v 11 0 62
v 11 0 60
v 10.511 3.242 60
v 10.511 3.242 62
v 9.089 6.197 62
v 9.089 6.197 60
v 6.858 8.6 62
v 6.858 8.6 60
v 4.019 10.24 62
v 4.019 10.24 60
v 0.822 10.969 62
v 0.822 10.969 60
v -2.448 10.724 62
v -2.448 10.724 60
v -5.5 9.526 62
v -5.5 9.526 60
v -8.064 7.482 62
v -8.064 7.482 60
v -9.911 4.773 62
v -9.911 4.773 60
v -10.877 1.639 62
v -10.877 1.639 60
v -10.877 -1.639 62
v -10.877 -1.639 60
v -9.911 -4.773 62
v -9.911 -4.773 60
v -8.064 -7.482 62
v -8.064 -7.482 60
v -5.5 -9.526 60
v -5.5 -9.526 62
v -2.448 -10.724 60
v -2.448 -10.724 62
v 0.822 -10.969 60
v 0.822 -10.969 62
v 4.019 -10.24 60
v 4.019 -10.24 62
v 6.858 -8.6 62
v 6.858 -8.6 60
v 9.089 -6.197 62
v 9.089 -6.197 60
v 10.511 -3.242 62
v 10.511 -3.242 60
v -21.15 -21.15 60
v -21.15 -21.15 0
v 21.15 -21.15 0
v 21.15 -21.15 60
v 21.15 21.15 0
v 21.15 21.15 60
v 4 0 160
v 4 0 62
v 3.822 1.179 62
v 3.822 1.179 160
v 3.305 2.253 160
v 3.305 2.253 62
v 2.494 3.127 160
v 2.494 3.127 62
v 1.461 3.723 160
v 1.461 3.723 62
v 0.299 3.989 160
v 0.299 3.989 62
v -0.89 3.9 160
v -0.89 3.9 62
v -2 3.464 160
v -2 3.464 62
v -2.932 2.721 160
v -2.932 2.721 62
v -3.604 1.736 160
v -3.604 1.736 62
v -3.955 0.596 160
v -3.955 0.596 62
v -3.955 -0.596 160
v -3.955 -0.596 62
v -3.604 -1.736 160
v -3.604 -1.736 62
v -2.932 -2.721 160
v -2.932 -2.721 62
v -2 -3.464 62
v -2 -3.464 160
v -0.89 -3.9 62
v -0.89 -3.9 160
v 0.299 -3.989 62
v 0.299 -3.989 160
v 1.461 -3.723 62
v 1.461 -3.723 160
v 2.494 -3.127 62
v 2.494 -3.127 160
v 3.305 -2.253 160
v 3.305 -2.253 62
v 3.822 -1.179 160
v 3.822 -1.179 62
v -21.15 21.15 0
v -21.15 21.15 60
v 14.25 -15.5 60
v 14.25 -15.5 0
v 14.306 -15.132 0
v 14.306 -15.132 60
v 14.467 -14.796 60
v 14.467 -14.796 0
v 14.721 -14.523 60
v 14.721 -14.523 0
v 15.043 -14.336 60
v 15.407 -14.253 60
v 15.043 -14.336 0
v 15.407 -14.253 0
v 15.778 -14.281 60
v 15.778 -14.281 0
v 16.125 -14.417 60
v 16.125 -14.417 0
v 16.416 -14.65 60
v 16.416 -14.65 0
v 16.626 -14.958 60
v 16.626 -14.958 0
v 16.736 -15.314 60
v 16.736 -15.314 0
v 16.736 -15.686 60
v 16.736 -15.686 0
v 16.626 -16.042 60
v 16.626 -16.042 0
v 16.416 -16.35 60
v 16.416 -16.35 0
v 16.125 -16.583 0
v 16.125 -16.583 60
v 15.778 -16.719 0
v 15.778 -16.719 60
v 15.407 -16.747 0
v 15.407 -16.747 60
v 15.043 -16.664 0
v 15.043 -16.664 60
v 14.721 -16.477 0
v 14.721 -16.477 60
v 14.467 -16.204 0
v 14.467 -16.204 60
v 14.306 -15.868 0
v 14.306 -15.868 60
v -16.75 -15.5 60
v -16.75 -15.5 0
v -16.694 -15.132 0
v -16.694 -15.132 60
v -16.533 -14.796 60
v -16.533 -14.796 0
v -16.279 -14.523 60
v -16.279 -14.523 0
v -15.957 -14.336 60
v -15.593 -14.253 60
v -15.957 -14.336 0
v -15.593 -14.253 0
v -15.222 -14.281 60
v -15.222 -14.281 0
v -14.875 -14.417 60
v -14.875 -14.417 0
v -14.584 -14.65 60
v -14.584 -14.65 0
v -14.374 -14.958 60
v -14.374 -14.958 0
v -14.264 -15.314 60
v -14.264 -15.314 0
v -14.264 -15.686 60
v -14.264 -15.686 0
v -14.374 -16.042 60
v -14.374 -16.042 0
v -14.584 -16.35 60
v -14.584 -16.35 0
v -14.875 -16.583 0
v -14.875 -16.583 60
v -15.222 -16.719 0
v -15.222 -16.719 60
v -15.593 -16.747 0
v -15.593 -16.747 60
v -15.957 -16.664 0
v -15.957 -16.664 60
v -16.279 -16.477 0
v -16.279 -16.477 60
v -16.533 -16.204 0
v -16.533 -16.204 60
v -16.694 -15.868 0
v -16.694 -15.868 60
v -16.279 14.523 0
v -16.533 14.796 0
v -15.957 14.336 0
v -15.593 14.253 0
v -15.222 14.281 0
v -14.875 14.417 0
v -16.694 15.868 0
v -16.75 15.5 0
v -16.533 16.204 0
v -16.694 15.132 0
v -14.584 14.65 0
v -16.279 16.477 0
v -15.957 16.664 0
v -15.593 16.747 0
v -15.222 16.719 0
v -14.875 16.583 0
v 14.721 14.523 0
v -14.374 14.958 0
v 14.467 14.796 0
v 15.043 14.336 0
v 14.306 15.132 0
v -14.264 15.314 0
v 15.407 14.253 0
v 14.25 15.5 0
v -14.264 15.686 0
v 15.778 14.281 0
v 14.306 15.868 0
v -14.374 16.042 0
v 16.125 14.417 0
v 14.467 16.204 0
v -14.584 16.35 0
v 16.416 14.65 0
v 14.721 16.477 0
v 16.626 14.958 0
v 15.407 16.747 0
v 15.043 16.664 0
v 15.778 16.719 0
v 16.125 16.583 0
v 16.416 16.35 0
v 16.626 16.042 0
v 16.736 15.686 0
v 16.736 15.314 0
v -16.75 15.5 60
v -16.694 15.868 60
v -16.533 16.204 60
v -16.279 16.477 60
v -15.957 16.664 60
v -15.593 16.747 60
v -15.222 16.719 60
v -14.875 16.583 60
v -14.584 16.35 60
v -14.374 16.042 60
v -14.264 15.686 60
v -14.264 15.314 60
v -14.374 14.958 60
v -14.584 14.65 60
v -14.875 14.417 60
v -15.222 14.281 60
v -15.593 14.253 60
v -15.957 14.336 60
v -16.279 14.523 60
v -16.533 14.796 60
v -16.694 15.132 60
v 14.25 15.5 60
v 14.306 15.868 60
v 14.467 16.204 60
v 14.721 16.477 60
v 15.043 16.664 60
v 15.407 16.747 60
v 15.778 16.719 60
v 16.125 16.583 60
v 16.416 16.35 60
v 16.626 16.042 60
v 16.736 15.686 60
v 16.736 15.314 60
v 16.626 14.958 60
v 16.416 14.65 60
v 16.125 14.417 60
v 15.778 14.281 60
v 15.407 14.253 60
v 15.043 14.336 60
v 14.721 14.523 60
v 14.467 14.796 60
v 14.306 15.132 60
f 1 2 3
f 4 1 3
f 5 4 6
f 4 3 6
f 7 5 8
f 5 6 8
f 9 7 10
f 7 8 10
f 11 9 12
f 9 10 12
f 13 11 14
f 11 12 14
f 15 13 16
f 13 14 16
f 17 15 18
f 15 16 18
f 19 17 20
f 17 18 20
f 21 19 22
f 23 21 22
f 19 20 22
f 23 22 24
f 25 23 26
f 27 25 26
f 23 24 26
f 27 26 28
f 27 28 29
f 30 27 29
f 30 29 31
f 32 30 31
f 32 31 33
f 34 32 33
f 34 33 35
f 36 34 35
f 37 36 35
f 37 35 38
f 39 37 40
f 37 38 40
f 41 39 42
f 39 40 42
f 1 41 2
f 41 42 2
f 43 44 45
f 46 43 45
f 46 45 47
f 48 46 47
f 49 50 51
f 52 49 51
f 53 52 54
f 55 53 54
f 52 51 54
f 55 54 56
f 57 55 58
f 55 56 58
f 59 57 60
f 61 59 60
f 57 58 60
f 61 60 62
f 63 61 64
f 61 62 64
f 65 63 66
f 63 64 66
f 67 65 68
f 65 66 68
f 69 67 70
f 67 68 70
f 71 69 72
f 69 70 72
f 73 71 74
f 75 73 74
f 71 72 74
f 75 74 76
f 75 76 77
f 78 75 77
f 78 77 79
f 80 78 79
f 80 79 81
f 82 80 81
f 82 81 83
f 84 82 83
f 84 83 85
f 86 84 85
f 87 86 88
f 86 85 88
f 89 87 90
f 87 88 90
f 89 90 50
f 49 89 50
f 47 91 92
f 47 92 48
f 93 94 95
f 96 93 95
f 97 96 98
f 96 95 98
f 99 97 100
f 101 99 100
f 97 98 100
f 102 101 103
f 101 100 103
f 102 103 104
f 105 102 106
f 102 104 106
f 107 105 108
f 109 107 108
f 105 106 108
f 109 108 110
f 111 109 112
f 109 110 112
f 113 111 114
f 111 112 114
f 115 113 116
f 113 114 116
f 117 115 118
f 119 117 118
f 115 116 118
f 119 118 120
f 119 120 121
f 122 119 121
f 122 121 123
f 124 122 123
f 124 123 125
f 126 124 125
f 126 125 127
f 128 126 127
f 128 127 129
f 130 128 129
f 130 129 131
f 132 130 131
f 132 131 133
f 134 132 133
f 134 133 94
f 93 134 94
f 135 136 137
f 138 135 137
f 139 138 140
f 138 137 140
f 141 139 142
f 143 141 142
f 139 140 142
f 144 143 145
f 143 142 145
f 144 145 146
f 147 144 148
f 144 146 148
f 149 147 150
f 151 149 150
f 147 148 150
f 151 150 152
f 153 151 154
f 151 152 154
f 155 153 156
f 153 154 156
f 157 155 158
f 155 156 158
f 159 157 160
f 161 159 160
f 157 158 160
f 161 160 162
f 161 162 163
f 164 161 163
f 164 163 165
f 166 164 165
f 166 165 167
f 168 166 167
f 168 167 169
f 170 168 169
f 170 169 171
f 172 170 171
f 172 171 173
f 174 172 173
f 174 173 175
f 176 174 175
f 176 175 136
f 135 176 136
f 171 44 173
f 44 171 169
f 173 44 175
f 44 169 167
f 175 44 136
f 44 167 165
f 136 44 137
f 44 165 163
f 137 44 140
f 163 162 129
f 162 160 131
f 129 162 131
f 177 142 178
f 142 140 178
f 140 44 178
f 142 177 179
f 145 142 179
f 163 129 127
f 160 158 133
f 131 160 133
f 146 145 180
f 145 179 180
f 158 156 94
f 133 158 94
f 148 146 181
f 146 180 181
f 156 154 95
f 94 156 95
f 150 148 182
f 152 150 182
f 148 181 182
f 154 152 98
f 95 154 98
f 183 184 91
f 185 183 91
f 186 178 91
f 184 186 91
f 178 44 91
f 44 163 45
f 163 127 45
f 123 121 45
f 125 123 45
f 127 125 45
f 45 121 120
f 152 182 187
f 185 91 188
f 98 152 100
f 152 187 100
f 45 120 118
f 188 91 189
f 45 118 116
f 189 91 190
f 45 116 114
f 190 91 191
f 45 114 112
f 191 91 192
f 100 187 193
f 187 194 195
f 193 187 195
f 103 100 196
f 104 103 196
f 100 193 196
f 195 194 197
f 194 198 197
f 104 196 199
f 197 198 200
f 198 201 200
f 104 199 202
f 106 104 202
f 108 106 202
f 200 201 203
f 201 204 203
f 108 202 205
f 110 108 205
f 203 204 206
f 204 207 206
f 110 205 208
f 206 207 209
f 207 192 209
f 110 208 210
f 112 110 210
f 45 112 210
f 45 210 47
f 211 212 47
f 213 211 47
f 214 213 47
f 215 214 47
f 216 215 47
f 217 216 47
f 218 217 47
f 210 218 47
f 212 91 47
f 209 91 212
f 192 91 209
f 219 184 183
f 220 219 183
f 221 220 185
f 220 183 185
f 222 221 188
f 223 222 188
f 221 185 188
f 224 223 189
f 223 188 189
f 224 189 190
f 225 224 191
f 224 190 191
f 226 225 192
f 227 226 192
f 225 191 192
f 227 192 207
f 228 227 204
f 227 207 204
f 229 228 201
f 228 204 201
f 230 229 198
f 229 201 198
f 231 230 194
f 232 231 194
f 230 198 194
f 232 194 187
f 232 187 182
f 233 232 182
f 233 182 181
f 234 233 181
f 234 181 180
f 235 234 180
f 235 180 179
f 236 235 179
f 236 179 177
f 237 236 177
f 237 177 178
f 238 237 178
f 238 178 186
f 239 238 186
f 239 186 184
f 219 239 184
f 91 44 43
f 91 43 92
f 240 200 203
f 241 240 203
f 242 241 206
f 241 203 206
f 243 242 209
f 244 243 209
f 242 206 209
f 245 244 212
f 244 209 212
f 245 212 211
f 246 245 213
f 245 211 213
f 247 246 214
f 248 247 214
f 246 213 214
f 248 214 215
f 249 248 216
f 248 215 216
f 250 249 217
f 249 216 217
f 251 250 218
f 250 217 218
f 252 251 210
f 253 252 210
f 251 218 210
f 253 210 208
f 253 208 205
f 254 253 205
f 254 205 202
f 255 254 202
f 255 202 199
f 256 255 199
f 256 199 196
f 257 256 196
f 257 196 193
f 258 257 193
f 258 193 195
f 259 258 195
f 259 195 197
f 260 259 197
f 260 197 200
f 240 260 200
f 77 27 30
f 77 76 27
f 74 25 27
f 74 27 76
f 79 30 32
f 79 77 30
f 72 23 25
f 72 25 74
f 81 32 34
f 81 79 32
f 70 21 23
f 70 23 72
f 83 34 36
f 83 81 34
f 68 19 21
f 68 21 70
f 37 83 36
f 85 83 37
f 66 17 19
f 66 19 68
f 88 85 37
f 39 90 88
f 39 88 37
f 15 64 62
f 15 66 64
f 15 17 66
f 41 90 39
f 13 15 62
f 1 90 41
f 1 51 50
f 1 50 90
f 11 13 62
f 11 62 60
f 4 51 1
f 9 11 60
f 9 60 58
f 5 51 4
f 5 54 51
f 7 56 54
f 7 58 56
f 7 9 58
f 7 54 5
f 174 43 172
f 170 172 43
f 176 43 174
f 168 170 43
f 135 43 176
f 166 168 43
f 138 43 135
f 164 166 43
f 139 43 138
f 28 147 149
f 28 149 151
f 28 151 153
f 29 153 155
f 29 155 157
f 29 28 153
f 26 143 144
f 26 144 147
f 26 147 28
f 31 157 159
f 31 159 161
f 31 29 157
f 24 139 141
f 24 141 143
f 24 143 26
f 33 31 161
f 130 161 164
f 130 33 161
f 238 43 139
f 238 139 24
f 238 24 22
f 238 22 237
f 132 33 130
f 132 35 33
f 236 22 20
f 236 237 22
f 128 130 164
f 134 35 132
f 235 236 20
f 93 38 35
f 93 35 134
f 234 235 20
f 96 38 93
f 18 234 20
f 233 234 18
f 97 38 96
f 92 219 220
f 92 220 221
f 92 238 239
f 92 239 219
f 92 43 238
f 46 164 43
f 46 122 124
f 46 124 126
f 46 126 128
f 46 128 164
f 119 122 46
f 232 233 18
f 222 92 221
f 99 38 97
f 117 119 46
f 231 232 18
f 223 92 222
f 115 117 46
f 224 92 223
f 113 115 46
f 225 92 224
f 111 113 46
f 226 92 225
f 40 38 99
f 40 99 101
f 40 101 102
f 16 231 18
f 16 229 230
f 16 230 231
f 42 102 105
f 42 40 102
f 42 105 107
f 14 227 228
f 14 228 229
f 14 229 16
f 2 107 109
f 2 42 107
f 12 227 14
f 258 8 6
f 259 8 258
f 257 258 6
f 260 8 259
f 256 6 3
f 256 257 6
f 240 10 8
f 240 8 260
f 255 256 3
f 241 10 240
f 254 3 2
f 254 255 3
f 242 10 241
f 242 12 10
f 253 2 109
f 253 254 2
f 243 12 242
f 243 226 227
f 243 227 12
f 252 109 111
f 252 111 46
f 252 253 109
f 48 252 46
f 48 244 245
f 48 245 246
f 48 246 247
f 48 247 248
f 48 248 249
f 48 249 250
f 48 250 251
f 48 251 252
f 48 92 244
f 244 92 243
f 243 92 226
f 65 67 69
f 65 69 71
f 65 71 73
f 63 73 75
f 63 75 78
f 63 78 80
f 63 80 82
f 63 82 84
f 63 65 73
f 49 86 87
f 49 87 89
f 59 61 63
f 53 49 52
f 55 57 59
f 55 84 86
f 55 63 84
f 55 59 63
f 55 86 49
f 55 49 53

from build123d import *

# Parameters (mm, degrees)
SKETCH_1_W         = 42.3
SKETCH_1_H         = 42.3
EXTRUDE_1_DEPTH    = 60
SKETCH_2_R         = 11
EXTRUDE_2_DEPTH    = 2
SKETCH_3_R         = 4
EXTRUDE_3_DEPTH    = 98
HOLE_WIZARD_M3_1_D = 2.5


with BuildPart() as part:
    # 草图1 → 凸台-拉伸1 (new body)
    with BuildSketch(Plane.XY):
        Rectangle(SKETCH_1_W, SKETCH_1_H)
    extrude(amount=EXTRUDE_1_DEPTH)

    # 草图2 → 凸台-拉伸2 (add)
    with BuildSketch(Plane.XY.offset(60)):
        Circle(SKETCH_2_R)
    extrude(amount=EXTRUDE_2_DEPTH)

    # 草图3 → 凸台-拉伸3 (add)
    with BuildSketch(Plane.XY.offset(62)):
        Circle(SKETCH_3_R)
    extrude(amount=EXTRUDE_3_DEPTH)

    # M3 螺纹孔1 (through all)
    with Locations(Plane.XY.offset(60)):
        with Locations((-15.5, 15.5), (15.5, 15.5), (15.5, -15.5), (-15.5, -15.5)):
            Hole(HOLE_WIZARD_M3_1_D / 2)


solid = part.part
